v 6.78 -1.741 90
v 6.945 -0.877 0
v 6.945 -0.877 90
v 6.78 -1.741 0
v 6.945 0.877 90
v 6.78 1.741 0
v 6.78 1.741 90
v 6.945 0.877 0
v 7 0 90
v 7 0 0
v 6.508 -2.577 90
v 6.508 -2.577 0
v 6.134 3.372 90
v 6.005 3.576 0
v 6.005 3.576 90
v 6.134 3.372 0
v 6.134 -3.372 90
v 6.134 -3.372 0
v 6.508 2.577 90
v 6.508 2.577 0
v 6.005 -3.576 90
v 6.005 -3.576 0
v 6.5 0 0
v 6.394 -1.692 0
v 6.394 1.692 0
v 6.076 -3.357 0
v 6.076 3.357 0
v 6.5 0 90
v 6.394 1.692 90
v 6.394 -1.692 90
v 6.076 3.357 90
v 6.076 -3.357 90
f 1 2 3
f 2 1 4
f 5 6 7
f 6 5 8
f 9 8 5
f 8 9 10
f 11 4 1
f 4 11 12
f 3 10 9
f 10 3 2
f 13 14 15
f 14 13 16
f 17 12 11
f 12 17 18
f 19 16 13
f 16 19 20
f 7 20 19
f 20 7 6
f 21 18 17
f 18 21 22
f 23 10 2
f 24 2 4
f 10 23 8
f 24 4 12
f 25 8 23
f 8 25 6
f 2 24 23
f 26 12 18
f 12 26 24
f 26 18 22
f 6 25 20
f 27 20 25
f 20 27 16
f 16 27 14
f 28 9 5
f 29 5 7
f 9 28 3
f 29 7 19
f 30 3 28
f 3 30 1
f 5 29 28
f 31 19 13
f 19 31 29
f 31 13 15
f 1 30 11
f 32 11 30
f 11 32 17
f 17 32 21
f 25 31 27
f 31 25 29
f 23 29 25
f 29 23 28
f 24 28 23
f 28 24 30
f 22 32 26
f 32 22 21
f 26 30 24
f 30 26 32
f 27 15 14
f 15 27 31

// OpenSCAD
$fn = 50;


difference() {
	union() {
		cylinder(h = 90, r = 7.0000000000);
		translate(v = [-10.0000000000, 0, 0]) {
			cylinder(h = 90, r = 7.0000000000);
		}
	}
	union() {
		cylinder(h = 90, r = 3.2500000000);
		cylinder(h = 90, r = 1.8000000000);
		cylinder(h = 90, r = 1.8000000000);
		cylinder(h = 90, r = 1.8000000000);
		translate(v = [-14.5000000000, 0, 0]) {
			hull() {
				translate(v = [-3.7500000000, 0.0000000000, 0]) {
					cylinder(h = 90, r = 10.5000000000);
				}
				translate(v = [3.7500000000, 0.0000000000, 0]) {
					cylinder(h = 90, r = 10.5000000000);
				}
				translate(v = [-3.7500000000, -0.0000000000, 0]) {
					cylinder(h = 90, r = 10.5000000000);
				}
				translate(v = [3.7500000000, -0.0000000000, 0]) {
					cylinder(h = 90, r = 10.5000000000);
				}
			}
		}
		translate(v = [-7.0000000000, 0, 0.0000000000]) {
			cylinder(h = 90, r = 13.5000000000);
		}
	}
}
